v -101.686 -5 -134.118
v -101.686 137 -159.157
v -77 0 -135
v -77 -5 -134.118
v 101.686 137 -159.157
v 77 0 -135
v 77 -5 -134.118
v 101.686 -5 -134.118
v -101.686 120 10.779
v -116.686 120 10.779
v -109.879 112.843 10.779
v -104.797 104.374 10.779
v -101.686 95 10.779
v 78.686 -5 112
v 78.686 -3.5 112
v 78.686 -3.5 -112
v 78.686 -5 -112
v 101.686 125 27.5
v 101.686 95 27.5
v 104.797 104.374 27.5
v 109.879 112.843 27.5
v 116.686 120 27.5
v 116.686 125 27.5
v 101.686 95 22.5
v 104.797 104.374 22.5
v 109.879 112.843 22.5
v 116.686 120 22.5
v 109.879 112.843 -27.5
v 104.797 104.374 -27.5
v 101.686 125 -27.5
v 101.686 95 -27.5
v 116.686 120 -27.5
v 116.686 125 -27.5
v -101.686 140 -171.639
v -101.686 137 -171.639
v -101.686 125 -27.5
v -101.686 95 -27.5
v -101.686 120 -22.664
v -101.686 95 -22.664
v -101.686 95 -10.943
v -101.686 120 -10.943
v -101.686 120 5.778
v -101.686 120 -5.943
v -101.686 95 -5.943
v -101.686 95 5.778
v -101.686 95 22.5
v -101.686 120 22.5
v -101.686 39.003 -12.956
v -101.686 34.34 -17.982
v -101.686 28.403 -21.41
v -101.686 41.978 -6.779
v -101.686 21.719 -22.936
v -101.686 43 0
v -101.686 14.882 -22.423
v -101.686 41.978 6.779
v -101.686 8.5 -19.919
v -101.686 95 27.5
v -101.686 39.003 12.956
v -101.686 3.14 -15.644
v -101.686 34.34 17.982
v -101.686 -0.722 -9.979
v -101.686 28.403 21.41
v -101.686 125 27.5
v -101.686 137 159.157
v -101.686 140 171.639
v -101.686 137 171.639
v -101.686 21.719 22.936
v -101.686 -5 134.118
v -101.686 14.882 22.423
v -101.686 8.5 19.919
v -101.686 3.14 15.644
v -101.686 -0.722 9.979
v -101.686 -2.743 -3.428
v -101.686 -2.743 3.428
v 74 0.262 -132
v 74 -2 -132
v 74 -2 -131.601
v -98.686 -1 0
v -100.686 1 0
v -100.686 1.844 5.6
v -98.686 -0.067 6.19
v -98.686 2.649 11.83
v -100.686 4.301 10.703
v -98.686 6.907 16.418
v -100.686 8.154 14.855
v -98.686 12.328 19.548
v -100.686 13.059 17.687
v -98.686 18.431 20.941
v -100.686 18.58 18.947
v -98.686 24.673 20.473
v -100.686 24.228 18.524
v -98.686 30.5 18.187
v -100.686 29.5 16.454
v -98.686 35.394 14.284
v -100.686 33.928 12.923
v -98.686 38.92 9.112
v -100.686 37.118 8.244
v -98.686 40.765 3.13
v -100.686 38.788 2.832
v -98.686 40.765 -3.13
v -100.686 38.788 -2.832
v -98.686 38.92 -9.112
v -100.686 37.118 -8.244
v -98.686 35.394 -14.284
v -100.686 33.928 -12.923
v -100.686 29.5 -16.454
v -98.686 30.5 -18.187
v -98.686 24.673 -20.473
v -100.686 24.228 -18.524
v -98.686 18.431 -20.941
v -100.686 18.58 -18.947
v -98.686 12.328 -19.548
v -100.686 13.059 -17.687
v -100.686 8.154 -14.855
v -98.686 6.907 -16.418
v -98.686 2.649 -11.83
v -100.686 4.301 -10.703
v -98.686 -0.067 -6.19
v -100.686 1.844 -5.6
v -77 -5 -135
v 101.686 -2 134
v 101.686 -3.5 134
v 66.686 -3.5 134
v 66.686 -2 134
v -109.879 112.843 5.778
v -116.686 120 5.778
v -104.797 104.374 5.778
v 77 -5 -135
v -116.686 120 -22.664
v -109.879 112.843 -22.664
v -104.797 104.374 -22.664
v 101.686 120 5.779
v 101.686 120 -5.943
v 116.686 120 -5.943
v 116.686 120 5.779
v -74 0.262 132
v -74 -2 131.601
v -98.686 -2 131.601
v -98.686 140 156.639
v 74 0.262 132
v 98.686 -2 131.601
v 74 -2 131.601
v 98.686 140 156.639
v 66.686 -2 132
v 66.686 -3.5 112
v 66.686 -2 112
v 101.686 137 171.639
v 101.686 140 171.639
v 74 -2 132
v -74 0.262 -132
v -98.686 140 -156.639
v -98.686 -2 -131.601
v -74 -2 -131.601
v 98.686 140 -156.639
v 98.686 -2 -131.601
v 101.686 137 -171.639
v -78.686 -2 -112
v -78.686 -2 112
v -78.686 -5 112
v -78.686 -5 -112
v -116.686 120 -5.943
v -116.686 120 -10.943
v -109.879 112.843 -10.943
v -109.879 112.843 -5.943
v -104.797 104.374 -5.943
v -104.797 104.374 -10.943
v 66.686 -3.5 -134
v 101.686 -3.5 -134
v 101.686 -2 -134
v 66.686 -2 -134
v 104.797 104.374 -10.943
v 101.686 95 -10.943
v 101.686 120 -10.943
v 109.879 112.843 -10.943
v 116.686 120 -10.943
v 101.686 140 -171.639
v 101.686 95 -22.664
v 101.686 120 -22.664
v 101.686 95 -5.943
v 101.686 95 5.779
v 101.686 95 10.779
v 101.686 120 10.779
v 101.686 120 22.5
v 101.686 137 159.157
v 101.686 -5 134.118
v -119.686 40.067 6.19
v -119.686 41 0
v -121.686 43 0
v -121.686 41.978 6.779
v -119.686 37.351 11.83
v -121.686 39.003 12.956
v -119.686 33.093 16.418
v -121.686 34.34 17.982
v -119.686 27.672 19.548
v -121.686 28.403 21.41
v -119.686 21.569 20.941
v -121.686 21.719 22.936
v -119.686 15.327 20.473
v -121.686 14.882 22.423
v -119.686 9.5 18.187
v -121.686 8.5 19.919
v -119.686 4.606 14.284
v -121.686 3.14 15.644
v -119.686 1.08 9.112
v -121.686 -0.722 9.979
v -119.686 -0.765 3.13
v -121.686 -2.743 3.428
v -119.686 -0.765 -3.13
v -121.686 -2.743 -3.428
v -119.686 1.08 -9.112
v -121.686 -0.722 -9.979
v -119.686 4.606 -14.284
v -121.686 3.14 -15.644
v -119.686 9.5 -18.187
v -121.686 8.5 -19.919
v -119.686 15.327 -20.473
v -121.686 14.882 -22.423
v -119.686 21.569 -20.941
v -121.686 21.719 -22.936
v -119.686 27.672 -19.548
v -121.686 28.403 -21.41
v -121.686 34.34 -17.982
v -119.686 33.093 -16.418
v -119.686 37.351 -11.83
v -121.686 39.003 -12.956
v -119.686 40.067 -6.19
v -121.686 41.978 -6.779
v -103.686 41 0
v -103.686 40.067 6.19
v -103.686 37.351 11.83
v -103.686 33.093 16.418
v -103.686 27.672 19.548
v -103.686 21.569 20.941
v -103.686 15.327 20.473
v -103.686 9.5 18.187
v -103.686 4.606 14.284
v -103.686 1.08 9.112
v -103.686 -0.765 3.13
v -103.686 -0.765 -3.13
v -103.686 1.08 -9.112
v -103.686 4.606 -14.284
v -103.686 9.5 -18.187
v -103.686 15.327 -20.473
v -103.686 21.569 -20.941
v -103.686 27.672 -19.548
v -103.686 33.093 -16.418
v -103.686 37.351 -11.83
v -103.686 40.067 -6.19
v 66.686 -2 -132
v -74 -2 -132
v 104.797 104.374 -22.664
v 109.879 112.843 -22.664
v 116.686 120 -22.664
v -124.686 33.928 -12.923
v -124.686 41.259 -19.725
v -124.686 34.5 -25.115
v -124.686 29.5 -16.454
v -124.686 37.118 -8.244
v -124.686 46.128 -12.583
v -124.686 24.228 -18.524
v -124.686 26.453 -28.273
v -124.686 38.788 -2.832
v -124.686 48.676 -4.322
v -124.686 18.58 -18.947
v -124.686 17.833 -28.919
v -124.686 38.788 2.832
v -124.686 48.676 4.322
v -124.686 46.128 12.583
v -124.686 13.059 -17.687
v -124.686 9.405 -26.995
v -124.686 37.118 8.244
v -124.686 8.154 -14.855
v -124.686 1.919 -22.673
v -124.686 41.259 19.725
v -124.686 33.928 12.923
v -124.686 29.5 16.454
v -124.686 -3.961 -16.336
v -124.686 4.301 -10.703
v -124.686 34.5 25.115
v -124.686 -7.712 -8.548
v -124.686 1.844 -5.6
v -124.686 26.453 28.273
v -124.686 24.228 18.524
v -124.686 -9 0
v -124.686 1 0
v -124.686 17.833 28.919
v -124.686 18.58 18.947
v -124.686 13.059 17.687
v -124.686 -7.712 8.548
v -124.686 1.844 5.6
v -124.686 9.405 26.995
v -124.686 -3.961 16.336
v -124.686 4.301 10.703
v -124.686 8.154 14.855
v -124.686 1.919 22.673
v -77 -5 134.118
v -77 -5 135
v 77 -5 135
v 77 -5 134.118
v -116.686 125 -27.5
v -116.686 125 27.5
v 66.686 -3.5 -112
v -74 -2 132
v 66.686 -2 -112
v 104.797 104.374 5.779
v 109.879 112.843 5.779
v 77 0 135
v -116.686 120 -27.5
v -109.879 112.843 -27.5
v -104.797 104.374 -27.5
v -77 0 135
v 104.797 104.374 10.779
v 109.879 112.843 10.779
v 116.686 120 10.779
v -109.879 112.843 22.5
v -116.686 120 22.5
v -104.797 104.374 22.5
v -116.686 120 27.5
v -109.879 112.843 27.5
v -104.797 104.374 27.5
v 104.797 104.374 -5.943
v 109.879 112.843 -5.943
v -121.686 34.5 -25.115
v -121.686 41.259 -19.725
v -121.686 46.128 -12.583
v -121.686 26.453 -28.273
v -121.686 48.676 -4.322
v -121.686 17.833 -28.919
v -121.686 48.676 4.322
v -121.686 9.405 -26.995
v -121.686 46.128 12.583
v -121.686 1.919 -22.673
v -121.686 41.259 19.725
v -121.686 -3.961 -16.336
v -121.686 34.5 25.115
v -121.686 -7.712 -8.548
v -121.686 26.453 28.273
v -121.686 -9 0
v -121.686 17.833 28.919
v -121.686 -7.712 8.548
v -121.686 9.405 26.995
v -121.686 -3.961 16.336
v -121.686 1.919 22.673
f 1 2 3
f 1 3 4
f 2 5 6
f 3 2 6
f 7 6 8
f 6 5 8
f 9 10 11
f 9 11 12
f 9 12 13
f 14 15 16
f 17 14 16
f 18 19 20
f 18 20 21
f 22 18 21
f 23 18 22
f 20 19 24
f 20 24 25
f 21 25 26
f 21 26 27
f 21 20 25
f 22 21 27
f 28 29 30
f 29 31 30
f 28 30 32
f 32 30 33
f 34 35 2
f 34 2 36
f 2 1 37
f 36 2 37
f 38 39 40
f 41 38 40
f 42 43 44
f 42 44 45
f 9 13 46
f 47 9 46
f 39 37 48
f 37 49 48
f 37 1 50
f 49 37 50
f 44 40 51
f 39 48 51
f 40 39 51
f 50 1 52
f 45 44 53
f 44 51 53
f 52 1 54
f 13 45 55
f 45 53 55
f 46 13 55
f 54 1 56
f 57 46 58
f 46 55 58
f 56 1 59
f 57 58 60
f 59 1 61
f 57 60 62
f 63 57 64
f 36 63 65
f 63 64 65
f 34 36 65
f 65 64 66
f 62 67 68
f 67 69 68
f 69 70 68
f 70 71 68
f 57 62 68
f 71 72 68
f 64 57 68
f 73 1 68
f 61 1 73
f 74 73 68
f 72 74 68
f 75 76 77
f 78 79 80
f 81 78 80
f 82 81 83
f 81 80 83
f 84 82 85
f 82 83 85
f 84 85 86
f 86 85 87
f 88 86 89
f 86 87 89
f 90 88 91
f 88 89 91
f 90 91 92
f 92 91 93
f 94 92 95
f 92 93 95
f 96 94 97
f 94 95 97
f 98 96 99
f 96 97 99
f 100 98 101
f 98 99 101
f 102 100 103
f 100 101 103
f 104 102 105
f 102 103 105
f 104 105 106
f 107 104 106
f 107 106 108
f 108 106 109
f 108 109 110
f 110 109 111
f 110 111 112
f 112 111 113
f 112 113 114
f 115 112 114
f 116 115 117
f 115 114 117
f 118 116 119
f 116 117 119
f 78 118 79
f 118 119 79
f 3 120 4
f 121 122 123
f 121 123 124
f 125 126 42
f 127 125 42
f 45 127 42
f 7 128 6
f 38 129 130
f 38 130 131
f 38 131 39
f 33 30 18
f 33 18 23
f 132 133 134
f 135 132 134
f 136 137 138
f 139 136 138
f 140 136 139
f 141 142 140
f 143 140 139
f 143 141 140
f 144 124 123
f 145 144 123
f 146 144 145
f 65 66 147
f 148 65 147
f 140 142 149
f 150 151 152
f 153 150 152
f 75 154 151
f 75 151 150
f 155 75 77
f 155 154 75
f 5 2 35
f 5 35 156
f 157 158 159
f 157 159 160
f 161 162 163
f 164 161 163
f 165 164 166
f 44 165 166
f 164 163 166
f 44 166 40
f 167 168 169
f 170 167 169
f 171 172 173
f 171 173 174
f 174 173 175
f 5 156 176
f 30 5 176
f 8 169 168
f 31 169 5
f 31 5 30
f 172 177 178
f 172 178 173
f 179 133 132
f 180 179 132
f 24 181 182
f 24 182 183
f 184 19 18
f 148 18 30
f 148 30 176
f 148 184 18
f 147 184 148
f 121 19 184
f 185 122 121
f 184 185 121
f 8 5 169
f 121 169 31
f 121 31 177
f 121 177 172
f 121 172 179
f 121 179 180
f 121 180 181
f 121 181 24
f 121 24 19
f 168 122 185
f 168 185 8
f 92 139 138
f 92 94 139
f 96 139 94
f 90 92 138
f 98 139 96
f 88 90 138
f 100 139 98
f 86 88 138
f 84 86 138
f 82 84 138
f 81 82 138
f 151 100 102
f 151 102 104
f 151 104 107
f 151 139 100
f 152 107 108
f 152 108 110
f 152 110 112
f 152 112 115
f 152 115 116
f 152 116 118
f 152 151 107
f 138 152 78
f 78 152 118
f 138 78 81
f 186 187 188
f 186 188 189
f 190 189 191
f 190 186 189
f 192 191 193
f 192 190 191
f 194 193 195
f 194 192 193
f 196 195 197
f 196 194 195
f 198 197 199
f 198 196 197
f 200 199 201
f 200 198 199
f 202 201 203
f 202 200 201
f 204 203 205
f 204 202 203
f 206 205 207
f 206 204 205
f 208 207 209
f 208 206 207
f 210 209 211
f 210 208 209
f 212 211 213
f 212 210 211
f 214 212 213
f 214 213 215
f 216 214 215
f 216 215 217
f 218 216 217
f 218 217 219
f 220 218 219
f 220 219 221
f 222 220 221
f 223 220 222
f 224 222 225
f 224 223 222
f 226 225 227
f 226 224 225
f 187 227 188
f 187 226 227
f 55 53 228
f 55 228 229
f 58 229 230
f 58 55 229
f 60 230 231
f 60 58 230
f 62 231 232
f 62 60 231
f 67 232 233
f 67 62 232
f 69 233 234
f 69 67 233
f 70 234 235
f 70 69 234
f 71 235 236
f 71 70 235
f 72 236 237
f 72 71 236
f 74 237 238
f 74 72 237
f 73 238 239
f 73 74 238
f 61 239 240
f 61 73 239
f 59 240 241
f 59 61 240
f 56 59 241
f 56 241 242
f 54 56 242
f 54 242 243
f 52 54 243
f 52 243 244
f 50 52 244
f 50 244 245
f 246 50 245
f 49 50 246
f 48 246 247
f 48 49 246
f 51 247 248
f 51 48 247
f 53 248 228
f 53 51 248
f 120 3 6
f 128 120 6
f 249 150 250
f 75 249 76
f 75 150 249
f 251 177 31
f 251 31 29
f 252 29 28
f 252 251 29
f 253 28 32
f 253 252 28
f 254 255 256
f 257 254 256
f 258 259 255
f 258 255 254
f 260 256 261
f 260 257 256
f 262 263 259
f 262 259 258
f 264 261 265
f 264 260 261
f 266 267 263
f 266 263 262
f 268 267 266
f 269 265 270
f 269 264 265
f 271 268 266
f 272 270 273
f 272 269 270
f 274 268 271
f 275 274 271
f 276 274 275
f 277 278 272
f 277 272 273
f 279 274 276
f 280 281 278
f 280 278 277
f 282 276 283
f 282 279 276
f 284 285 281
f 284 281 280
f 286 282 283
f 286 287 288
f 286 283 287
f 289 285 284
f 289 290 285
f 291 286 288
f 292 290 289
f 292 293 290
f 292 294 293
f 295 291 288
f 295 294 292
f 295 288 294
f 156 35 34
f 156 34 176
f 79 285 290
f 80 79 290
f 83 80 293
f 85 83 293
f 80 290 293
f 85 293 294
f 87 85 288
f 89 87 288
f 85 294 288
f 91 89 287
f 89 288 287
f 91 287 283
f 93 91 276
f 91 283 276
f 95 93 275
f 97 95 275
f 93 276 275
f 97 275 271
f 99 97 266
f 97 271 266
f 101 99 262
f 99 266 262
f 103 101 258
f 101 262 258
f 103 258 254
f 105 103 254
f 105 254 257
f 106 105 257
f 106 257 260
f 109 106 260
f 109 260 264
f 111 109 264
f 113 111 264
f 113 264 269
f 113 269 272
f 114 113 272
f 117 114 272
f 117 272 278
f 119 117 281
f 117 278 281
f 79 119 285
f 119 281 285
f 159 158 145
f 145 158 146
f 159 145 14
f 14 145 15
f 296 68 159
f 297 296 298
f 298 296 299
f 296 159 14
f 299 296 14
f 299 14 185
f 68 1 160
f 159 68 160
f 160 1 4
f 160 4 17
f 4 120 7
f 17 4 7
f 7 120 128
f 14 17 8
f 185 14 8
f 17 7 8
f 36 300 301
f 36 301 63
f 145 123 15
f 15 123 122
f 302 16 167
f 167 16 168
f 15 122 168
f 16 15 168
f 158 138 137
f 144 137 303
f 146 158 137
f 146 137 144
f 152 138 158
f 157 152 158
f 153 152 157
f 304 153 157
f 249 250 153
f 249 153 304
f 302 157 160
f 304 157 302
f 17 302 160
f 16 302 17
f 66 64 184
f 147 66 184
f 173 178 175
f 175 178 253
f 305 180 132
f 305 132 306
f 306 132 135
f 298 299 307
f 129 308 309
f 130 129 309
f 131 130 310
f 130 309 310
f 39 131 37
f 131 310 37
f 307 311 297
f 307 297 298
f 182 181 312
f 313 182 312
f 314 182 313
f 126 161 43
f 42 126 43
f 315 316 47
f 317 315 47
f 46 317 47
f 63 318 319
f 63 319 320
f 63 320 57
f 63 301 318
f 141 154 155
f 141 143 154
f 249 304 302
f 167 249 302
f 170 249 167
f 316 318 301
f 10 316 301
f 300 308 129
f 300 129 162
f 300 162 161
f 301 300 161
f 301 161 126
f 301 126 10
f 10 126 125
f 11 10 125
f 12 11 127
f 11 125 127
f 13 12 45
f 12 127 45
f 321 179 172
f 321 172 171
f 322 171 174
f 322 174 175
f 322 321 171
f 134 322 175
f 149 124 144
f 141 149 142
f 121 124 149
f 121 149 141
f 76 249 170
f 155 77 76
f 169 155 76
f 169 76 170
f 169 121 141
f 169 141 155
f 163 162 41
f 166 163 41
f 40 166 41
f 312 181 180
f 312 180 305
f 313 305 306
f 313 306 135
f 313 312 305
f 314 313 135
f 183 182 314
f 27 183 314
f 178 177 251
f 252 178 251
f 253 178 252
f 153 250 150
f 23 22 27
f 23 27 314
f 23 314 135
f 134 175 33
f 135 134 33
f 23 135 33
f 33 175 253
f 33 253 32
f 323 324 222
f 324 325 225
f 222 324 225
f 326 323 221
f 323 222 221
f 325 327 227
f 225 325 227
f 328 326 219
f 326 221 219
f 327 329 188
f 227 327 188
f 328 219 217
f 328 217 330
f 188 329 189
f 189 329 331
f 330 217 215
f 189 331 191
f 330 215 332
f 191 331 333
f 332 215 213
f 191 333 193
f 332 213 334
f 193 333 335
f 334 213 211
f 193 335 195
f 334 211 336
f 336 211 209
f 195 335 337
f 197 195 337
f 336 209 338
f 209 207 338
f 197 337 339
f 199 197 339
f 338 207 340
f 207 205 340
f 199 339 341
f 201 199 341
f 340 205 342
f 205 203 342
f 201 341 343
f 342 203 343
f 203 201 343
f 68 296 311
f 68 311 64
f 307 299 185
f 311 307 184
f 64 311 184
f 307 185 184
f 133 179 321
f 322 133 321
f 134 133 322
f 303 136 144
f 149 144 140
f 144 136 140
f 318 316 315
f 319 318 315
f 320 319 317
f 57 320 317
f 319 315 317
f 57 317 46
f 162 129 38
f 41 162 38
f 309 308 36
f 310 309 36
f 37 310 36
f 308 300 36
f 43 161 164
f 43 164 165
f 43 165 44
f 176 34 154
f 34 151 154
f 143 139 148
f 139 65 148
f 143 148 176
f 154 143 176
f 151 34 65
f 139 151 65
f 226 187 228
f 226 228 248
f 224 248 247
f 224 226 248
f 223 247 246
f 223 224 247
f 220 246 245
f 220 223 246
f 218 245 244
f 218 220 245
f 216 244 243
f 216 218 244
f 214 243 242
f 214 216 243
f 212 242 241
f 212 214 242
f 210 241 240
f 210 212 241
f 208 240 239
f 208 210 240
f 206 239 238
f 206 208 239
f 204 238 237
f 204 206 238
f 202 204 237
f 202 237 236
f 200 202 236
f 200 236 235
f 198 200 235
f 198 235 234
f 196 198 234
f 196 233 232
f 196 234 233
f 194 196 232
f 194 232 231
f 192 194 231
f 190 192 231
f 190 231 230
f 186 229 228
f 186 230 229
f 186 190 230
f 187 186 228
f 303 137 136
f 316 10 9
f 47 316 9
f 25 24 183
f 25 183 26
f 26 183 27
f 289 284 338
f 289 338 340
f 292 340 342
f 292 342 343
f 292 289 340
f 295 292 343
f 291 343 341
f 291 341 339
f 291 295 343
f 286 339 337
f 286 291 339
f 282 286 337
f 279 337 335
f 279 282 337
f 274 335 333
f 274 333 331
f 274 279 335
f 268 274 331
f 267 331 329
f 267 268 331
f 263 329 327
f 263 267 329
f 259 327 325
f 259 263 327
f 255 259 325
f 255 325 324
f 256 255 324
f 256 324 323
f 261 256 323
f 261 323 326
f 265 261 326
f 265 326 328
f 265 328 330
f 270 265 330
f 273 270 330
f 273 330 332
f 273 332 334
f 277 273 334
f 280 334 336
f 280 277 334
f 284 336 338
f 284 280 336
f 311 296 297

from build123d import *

# Parameters (mm, degrees)
SKETCH1_W                       = 154
SKETCH1_H                       = 270
BOSS_EXTRUDE1_DEPTH             = 140
BOSS_EXTRUDE1_DRAFT             = -10
SKETCH2_W                       = 154
SKETCH2_H                       = 270
BOSS_EXTRUDE2_DEPTH             = 5
BOSS_EXTRUDE3_REACH             = 237.456
BOSS_EXTRUDE3_DIRECTION_2_REACH = 237.456
SHELL1_T                        = -3
SKETCH5_W                       = 15
SKETCH5_H                       = 55
BOSS_EXTRUDE4_DEPTH             = 5
BOSS_EXTRUDE5_DEPTH             = 5
LPATTERN1_COUNT                 = 4
LPATTERN1_PITCH                 = 16.7215
SKETCH7_W                       = 15
SKETCH7_H                       = 0.1645
CUT_EXTRUDE2_DEPTH              = 234.966061846
MIRROR2_START                   = -27.5
MIRROR2_OUTLINE_W               = 15
MIRROR2_OUTLINE_H               = 5
MIRROR2_DEPTH                   = 55
MIRROR2_START_2                 = -10.943
MIRROR2_2_DEPTH                 = 5
MIRROR2_START_3                 = 5.7785
MIRROR2_3_DEPTH                 = 5
MIRROR2_START_4                 = 22.5
MIRROR2_4_DEPTH                 = 5
MIRROR2_5_DEPTH                 = 4.8355
SKETCH8_W                       = 268
SKETCH8_H                       = 1.5
CUT_EXTRUDE3_DEPTH              = 35
SKETCH9_R                       = 19
CUT_EXTRUDE4_DEPTH              = 35
SKETCH10_W                      = 157.371554598
SKETCH10_H                      = 224
CUT_EXTRUDE5_DEPTH              = 35
BOSS_EXTRUDE6_START             = 20
SKETCH11_R                      = 21
SKETCH11_R_2                    = 19
BOSS_EXTRUDE6_DEPTH             = 20
BOSS_EXTRUDE7_START             = 3
SKETCH12_R                      = 29
SKETCH12_R_2                    = 19
BOSS_EXTRUDE7_DEPTH             = 3
CHAMFER1_SIZE                   = 2
BOSS_EXTRUDE8_START             = 137
BOSS_EXTRUDE8_2_OUTLINE_W       = 203.371554598
BOSS_EXTRUDE8_2_OUTLINE_H       = 12.482701107
BOSS_EXTRUDE8_2_DEPTH           = 3


with BuildPart() as part:
    # Sketch1 → Boss-Extrude1 (with draft: the straight prism first)
    with BuildSketch(Plane(origin=(0, 0, 0), x_dir=(1, 0, 0), z_dir=(0, 1, 0))):
        Rectangle(SKETCH1_W, SKETCH1_H)
    extrude(amount=BOSS_EXTRUDE1_DEPTH)
    # Boss-Extrude1: the draft: its side faces are tilted about the plane it starts from
    boss_extrude1_sides = [part.faces().sort_by_distance(p)[0] for p in [
        (-77, 70, 0),
        (0, 70, 135),
        (77, 70, 0),
        (0, 70, -135),
    ]]
    draft(boss_extrude1_sides, Plane(origin=(0, 0, 0), x_dir=(1, 0, 0), z_dir=(0, 1, 0)), BOSS_EXTRUDE1_DRAFT)

    # Sketch2 → Boss-Extrude2 (add)
    with BuildSketch(Plane.XZ):
        Rectangle(SKETCH2_W, SKETCH2_H)
    extrude(amount=BOSS_EXTRUDE2_DEPTH)

    # Boss-Extrude3: up to this plane
    boss_extrude3_end = Plane(origin=(-77, 0, 135), z_dir=(0, -0.17364817766693072, 0.984807753012208))
    # Sketch4 → Boss-Extrude3 (add, up to the surface)
    with BuildSketch(Plane.XY, mode=Mode.PRIVATE) as boss_extrude3_sk1:
        Polygon((101.685777299, -5), (77, -5), (77, 0), (101.685777299, 140), align=None)
    boss_extrude3_tool1 = split(extrude(boss_extrude3_sk1.sketch, amount=BOSS_EXTRUDE3_REACH, mode=Mode.PRIVATE), bisect_by=boss_extrude3_end, keep=Keep.BOTH, mode=Mode.PRIVATE)
    boss_extrude3 = boss_extrude3_tool1.solids().sort_by_distance((93.182898, 43.388889, 0))[0]
    add(boss_extrude3)

    # Boss-Extrude3 direction 2: up to this plane
    boss_extrude3_direction_2_end = Plane(origin=(-77, 0, -135), z_dir=(0, -0.17364817766693072, -0.984807753012208))
    # Sketch4 → Boss-Extrude3 direction 2 (add, up to the surface)
    with BuildSketch(Plane.XY, mode=Mode.PRIVATE) as boss_extrude3_direction_2_sk1:
        Polygon((101.685777299, -5), (77, -5), (77, 0), (101.685777299, 140), align=None)
    boss_extrude3_direction_2_tool1 = split(extrude(boss_extrude3_direction_2_sk1.sketch, amount=-BOSS_EXTRUDE3_DIRECTION_2_REACH, mode=Mode.PRIVATE), bisect_by=boss_extrude3_direction_2_end, keep=Keep.BOTH, mode=Mode.PRIVATE)
    boss_extrude3_direction_2 = boss_extrude3_direction_2_tool1.solids().sort_by_distance((93.182898, 43.388889, 0))[0]
    add(boss_extrude3_direction_2)
    boss_extrude3 = boss_extrude3 + boss_extrude3_direction_2  # both directions under the feature's name, for the pattern or mirror that repeats it

    # Mirror1: Boss-Extrude3 across plane
    add(boss_extrude3.mirror(Plane(origin=(0, 0, 0), x_dir=(0, 0, 1), z_dir=(1, 0, 0))))

    # Shell1
    shell1_openings = [part.faces().sort_by_distance(p)[0] for p in [
        (0, 140, 0),
    ]]
    offset(amount=SHELL1_T, openings=shell1_openings, kind=Kind.INTERSECTION)

    # Sketch5 → Boss-Extrude4 (add)
    with BuildSketch(Plane(origin=(0, 120, 0), x_dir=(1, 0, 0), z_dir=(0, 1, 0))):
        with Locations((109.185777299, 0)):
            Rectangle(SKETCH5_W, SKETCH5_H)
    extrude(amount=BOSS_EXTRUDE4_DEPTH)

    # Sketch6 → Boss-Extrude5 (add)
    with BuildSketch(Plane.XY.offset(27.5)):
        with BuildLine():
            Line((101.685777299, 120), (101.685777299, 95))
            ThreePointArc((101.685777299, 95), (107.105041487, 108.748441487), (116.685777299, 120))
            Line((116.685777299, 120), (101.685777299, 120))
        make_face()
    boss_extrude5 = extrude(amount=-BOSS_EXTRUDE5_DEPTH)

    # LPattern1: Boss-Extrude5 ×4
    with Locations(*[(0, 0, -i * LPATTERN1_PITCH) for i in range(1, LPATTERN1_COUNT)]):
        add(boss_extrude5)

    # Sketch7 → Cut-Extrude2 (cut, through all)
    with BuildSketch(Plane(origin=(0, 120, 0), x_dir=(1, 0, 0), z_dir=(0, 1, 0))):
        with Locations((109.185777299, 27.58225)):
            Rectangle(SKETCH7_W, SKETCH7_H)
    extrude(amount=-CUT_EXTRUDE2_DEPTH, mode=Mode.SUBTRACT)

    # Mirror2: read off the stored shape, not the designer's step
    # Mirror2 outline → Mirror2 (add)
    with BuildSketch(Plane.XY.offset(MIRROR2_START)):
        with Locations((-109.185777299, 122.5)):
            Rectangle(MIRROR2_OUTLINE_W, MIRROR2_OUTLINE_H)
    extrude(amount=MIRROR2_DEPTH)

    # Mirror2 2 outline → Mirror2 2 (add)
    with BuildSketch(Plane.XY.offset(MIRROR2_START_2)):
        with BuildLine():
            ThreePointArc((-116.685777299, 120), (-107.105041487, 108.748441487), (-101.685777299, 95))
            Line((-101.685777299, 95), (-101.685777299, 120))
            Line((-101.685777299, 120), (-116.685777299, 120))
        make_face()
    extrude(amount=MIRROR2_2_DEPTH)

    # Mirror2 3 outline → Mirror2 3 (add)
    with BuildSketch(Plane.XY.offset(MIRROR2_START_3)):
        with BuildLine():
            ThreePointArc((-116.685777299, 120), (-107.105041487, 108.748441487), (-101.685777299, 95))
            Line((-101.685777299, 95), (-101.685777299, 120))
            Line((-101.685777299, 120), (-116.685777299, 120))
        make_face()
    extrude(amount=MIRROR2_3_DEPTH)

    # Mirror2 4 outline → Mirror2 4 (add)
    with BuildSketch(Plane.XY.offset(MIRROR2_START_4)):
        with BuildLine():
            ThreePointArc((-116.685777299, 120), (-107.105041487, 108.748441487), (-101.685777299, 95))
            Line((-101.685777299, 95), (-101.685777299, 120))
            Line((-101.685777299, 120), (-116.685777299, 120))
        make_face()
    extrude(amount=MIRROR2_4_DEPTH)

    # Mirror2 5 outline → Mirror2 5 (add)
    with BuildSketch(Plane.XY.offset(MIRROR2_START)):
        with BuildLine():
            ThreePointArc((-116.685777299, 120), (-107.105041487, 108.748441487), (-101.685777299, 95))
            Line((-101.685777299, 95), (-101.685777299, 120))
            Line((-101.685777299, 120), (-116.685777299, 120))
        make_face()
    extrude(amount=MIRROR2_5_DEPTH)

    # Sketch8 → Cut-Extrude3 (cut)
    with BuildSketch(Plane(origin=(101.685777299, 0, 0), x_dir=(0, 0, -1), z_dir=(1, 0, 0))):
        with Locations((0, -2.75)):
            Rectangle(SKETCH8_W, SKETCH8_H)
    extrude(amount=-CUT_EXTRUDE3_DEPTH, mode=Mode.SUBTRACT)

    # Sketch9 → Cut-Extrude4 (cut)
    with BuildSketch(Plane.ZY.offset(101.685777299)):
        with Locations(Location((0, 20, 0), (0, 0, 270))):
            Circle(SKETCH9_R)
    extrude(amount=-CUT_EXTRUDE4_DEPTH, mode=Mode.SUBTRACT)

    # Sketch10 → Cut-Extrude5 (cut)
    with BuildSketch(Plane(origin=(0, -2, 0), x_dir=(1, 0, 0), z_dir=(0, 1, 0))):
        Rectangle(SKETCH10_W, SKETCH10_H)
    extrude(amount=-CUT_EXTRUDE5_DEPTH, mode=Mode.SUBTRACT)

    # Sketch11 → Boss-Extrude6 (add)
    with BuildSketch(Plane.ZY.offset(101.685777299).offset(BOSS_EXTRUDE6_START)):
        with Locations(Location((0, 20, 0), (0, 0, 90))):
            Circle(SKETCH11_R)
        with Locations(Location((0, 20, 0), (0, 0, 270))):
            Circle(SKETCH11_R_2, mode=Mode.SUBTRACT)
    extrude(amount=-BOSS_EXTRUDE6_DEPTH)

    # Sketch12 → Boss-Extrude7 (add)
    with BuildSketch(Plane.ZY.offset(121.685777299).offset(BOSS_EXTRUDE7_START)):
        with Locations(Location((0, 20, 0), (0, 0, 270))):
            Circle(SKETCH12_R)
        with Locations(Location((0, 20, 0), (0, 0, 270))):
            Circle(SKETCH12_R_2, mode=Mode.SUBTRACT)
    extrude(amount=-BOSS_EXTRUDE7_DEPTH)

    # Chamfer1
    chamfer1_edges = [part.edges().sort_by_distance(p)[0] for p in [
        (-98.685777299, 39, 0),
    ]]
    chamfer(chamfer1_edges, length=CHAMFER1_SIZE)

    # Boss-Extrude8: read off the stored shape, not the designer's step
    # Boss-Extrude8 outline → Boss-Extrude8 (revolve)
    with BuildSketch(Plane(origin=(0, 20, 0), x_dir=(0, 1, 0), z_dir=(0, 0, -1))):
        Polygon((23, -121.685777299), (21, -119.685777299), (21, -121.685777299), align=None)
        Polygon((21, -101.685777299), (21, -103.685777299), (23, -101.685777299), align=None)
    boss_extrude8 = revolve(axis=Axis((0, 20, 0), (1, 0, 0)))

    # Boss-Extrude8 2 outline → Boss-Extrude8 2 (add)
    with BuildSketch(Plane(origin=(0, 0, 0), x_dir=(1, 0, 0), z_dir=(0, 1, 0)).offset(BOSS_EXTRUDE8_START)):
        with Locations((0, -165.398146911)):
            Rectangle(BOSS_EXTRUDE8_2_OUTLINE_W, BOSS_EXTRUDE8_2_OUTLINE_H)
    boss_extrude8_2 = extrude(amount=BOSS_EXTRUDE8_2_DEPTH)

    # Mirror3: Boss-Extrude8, Boss-Extrude8 2 across plane
    add(boss_extrude8.mirror(Plane.XY))
    add(boss_extrude8_2.mirror(Plane.XY))


solid = part.part
